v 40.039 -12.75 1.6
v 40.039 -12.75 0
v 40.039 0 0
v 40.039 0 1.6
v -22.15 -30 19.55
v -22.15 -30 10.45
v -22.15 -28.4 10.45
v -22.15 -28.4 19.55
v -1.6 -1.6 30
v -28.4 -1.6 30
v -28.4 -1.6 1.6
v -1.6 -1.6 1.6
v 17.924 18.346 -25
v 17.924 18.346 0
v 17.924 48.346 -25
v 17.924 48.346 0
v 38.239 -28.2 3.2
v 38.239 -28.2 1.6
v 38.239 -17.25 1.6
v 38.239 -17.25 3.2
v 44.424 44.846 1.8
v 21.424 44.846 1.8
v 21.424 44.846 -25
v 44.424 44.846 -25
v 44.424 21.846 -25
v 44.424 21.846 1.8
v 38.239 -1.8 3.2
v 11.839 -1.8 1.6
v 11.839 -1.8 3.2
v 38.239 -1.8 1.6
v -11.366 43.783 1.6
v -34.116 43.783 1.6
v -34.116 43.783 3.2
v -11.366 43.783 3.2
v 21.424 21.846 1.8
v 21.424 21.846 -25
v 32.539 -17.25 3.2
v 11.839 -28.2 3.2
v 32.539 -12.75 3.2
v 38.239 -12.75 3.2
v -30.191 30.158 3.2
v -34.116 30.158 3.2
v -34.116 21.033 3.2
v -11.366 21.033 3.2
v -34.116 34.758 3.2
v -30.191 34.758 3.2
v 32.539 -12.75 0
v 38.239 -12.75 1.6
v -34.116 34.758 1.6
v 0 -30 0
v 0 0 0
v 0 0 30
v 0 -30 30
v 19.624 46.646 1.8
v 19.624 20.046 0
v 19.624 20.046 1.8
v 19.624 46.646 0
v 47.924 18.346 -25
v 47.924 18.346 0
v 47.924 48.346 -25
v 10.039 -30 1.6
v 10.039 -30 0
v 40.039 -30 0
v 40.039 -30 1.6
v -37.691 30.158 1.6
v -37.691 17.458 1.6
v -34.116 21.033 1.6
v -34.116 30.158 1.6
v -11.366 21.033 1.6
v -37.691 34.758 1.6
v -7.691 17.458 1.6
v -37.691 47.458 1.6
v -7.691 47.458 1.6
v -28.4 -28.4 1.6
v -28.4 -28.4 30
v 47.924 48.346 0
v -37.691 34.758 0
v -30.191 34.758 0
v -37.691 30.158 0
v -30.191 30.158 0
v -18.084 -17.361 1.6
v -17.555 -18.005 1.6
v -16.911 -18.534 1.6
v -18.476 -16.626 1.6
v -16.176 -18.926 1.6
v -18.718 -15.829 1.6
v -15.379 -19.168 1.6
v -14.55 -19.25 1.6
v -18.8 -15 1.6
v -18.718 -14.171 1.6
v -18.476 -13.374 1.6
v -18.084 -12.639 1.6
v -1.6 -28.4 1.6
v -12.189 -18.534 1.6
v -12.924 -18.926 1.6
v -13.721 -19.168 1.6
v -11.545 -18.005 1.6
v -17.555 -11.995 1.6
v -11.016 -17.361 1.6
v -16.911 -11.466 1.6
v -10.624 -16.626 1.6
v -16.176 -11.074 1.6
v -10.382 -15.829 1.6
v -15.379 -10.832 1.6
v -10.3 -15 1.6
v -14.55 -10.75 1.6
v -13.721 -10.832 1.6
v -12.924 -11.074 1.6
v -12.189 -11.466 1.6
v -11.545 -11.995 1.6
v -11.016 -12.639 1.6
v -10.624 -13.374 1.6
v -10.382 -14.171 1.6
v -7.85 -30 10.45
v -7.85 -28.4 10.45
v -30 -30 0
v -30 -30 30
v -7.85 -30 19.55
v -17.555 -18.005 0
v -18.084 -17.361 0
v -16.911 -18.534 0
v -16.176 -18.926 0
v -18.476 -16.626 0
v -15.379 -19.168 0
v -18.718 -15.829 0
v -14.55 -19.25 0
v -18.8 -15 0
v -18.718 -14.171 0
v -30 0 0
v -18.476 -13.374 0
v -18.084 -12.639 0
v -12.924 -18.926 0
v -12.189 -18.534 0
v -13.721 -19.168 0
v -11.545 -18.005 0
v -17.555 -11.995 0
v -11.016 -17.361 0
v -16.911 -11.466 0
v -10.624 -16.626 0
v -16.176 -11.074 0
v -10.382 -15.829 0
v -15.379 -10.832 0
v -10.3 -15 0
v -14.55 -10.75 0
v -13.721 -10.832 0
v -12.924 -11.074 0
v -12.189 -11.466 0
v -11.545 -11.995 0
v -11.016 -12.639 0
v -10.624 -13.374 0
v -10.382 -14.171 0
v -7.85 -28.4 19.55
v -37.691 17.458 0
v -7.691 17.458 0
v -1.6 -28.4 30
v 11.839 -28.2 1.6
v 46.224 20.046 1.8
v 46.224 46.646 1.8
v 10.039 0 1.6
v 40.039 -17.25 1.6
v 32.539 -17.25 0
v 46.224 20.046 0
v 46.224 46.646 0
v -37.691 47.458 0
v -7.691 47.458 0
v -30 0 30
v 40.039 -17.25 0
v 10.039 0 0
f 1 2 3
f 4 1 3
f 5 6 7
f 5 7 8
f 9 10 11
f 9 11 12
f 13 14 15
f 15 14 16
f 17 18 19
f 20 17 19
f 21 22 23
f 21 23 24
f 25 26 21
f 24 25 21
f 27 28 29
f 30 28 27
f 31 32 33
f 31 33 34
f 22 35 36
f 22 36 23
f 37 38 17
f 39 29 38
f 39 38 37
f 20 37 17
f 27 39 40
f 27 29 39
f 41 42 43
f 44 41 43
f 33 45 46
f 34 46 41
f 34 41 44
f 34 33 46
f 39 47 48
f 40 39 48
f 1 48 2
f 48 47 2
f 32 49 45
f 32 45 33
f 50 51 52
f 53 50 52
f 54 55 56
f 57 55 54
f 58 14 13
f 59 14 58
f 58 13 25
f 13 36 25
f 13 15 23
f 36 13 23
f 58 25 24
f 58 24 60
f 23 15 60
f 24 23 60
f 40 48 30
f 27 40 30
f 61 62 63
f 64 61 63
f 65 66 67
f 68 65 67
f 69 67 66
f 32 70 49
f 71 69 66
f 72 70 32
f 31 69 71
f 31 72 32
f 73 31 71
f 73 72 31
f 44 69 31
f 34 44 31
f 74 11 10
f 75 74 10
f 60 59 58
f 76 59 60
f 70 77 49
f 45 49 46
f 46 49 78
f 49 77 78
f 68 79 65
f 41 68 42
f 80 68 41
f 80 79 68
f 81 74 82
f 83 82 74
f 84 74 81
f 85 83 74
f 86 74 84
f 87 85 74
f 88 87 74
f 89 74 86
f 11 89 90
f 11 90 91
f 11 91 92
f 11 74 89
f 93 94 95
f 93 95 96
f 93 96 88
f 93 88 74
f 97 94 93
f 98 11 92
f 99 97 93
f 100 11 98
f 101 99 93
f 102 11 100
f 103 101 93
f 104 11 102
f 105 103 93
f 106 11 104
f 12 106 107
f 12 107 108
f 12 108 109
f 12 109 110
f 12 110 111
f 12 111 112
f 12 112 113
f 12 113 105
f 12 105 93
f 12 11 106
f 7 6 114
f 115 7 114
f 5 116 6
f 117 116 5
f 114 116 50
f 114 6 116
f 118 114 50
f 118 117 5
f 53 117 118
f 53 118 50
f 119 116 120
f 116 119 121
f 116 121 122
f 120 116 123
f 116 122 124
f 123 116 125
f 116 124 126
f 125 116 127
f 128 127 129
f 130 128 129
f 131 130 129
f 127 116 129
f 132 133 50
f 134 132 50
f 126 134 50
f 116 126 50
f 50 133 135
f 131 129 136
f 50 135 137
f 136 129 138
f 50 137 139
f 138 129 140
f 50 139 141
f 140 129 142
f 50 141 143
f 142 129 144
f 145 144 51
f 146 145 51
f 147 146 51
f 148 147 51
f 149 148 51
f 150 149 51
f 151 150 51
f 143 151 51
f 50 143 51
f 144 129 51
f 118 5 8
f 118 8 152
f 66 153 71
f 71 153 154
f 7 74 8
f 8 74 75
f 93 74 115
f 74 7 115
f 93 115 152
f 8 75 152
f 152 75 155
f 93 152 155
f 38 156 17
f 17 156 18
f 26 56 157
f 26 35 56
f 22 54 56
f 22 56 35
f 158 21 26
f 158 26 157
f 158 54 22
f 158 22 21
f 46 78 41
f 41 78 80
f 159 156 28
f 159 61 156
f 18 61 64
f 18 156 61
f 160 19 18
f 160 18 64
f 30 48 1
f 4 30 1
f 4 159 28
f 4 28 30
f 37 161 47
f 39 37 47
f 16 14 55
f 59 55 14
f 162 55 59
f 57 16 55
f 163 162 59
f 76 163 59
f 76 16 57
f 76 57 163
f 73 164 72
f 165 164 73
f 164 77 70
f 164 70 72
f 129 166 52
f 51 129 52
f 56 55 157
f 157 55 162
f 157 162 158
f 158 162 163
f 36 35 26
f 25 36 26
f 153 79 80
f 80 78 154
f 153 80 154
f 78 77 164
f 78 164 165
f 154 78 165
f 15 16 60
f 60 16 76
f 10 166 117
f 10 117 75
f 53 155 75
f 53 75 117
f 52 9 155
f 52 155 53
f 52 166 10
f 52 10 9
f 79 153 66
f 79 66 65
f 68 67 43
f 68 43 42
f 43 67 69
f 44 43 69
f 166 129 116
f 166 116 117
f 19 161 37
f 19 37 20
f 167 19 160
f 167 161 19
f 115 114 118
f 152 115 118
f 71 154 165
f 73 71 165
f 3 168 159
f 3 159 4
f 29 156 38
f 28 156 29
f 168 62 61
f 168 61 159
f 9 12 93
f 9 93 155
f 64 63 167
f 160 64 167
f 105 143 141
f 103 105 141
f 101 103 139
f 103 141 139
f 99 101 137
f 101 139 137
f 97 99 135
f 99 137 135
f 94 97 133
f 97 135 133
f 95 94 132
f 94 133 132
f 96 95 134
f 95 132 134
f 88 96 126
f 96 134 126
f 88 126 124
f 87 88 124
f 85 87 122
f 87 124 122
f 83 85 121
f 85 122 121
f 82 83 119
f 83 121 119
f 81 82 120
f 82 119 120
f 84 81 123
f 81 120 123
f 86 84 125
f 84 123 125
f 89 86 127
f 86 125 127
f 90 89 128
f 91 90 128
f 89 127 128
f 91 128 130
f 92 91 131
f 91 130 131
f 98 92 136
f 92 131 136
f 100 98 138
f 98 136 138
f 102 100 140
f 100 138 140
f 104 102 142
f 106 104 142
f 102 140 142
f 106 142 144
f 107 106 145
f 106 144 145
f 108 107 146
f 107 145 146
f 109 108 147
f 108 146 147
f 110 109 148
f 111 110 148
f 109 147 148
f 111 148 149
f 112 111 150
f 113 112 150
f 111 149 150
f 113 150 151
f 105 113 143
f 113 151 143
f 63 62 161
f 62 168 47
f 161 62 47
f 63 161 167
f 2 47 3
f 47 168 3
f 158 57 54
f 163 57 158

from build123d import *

# Parameters (mm, degrees)
F0_W      = 30
F0_H      = 30
F1_DEPTH  = 30
F2_T      = -1.6
F3_W      = 14.3
F3_H      = 9.1
F4_DEPTH  = 1.6
F5_R      = 4.25
F6_DEPTH  = 1.6
F7_W      = 30
F7_H      = 30
F7_W_2    = 13.2
F7_H_2    = 26.4
F8_DEPTH  = 1.6
F9_W      = 26.4
F9_H      = 26.4
F10_DEPTH = 1.6
F11_W     = 7.5
F11_H     = 4.5
F12_DEPTH = 30.001
F13_W     = 30
F13_H     = 30
F14_DEPTH = 25
F15_W     = 26.6
F15_H     = 26.6
F16_DEPTH = 1.8
F17_W     = 23
F17_H     = 23
F18_DEPTH = 26.801
F19_W     = 30
F19_H     = 30
F20_DEPTH = 1.6
F21_W     = 22.75
F21_H     = 22.75
F22_DEPTH = 1.6
F23_W     = 7.5
F23_H     = 4.6
F24_DEPTH = 30.001


with BuildPart() as f1:
    # F0 (on Front) → F1 (new body)
    with BuildSketch(Plane.XZ):
        with Locations((-15, 15)):
            Rectangle(F0_W, F0_H)
    extrude(amount=F1_DEPTH)

    # F2
    f2_openings = [f1.faces().sort_by_distance(p)[0] for p in [
        (-15, -15, 30),
    ]]
    offset(amount=F2_T, openings=f2_openings)

    # F3 (on face) → F4 (cut)
    with BuildSketch(Plane.XZ.offset(30)):
        with Locations((-15, 15)):
            Rectangle(F3_W, F3_H)
    extrude(amount=-F4_DEPTH, mode=Mode.SUBTRACT)

    # F5 (on face) → F6 (cut)
    with BuildSketch(Plane(origin=(0, 0, 0), x_dir=(1, 0, 0), z_dir=(0, 0, -1))):
        with Locations((-14.55, 15)):
            Circle(F5_R)
    extrude(amount=-F6_DEPTH, mode=Mode.SUBTRACT)


with BuildPart() as f8:
    # F7 (on Top) → F8 (new body)
    with BuildSketch(Plane.XY):
        with Locations((25.039431, -15)):
            Rectangle(F7_W, F7_H)
        Polygon((11.839431, -28.2), (11.839431, -1.8), (25.039431, -1.8), (38.239431, -1.8), (38.239431, -28.2), (25.039431, -28.2), align=None, mode=Mode.SUBTRACT)
        with Locations((18.439431, -15)):
            Rectangle(F7_W_2, F7_H_2)
        with Locations((31.639431, -15)):
            Rectangle(F7_W_2, F7_H_2)
    extrude(amount=F8_DEPTH)

    # F9 (on face) → F10 (join)
    with BuildSketch(Plane.XY.offset(1.6)):
        with Locations((25.039431, -15)):
            Rectangle(F9_W, F9_H)
    extrude(amount=F10_DEPTH)

    # F11 (on face) → F12 (cut, through all)
    with BuildSketch(Plane.XY):
        with Locations((36.289431, -15)):
            Rectangle(F11_W, F11_H)
    extrude(amount=F12_DEPTH, mode=Mode.SUBTRACT)


with BuildPart() as f14:
    # F13 (on Top) → F14 (new body)
    with BuildSketch(Plane.XY):
        with Locations((32.92393, 33.345879)):
            Rectangle(F13_W, F13_H)
    extrude(amount=-F14_DEPTH)

    # F15 (on face) → F16 (join)
    with BuildSketch(Plane.XY):
        with Locations((32.92393, 33.345879)):
            Rectangle(F15_W, F15_H)
    extrude(amount=F16_DEPTH)

    # F17 (on face) → F18 (cut, through all)
    with BuildSketch(Plane.XY.offset(1.8)):
        with Locations((32.92393, 33.345879)):
            Rectangle(F17_W, F17_H)
    extrude(amount=-F18_DEPTH, mode=Mode.SUBTRACT)


with BuildPart() as f20:
    # F19 (on Top) → F20 (new body)
    with BuildSketch(Plane.XY):
        with Locations((-22.690918, 32.458312)):
            Rectangle(F19_W, F19_H)
    extrude(amount=F20_DEPTH)

    # F21 (on face) → F22 (join)
    with BuildSketch(Plane.XY.offset(1.6)):
        with Locations((-22.740918, 32.408312)):
            Rectangle(F21_W, F21_H)
    extrude(amount=F22_DEPTH)

    # F23 (on face) → F24 (cut, through all)
    with BuildSketch(Plane(origin=(0, 0, 0), x_dir=(1, 0, 0), z_dir=(0, 0, -1))):
        with Locations((-33.940918, -32.458312)):
            Rectangle(F23_W, F23_H)
    extrude(amount=-F24_DEPTH, mode=Mode.SUBTRACT)


solid = Compound([f1.part, f8.part, f14.part, f20.part])
